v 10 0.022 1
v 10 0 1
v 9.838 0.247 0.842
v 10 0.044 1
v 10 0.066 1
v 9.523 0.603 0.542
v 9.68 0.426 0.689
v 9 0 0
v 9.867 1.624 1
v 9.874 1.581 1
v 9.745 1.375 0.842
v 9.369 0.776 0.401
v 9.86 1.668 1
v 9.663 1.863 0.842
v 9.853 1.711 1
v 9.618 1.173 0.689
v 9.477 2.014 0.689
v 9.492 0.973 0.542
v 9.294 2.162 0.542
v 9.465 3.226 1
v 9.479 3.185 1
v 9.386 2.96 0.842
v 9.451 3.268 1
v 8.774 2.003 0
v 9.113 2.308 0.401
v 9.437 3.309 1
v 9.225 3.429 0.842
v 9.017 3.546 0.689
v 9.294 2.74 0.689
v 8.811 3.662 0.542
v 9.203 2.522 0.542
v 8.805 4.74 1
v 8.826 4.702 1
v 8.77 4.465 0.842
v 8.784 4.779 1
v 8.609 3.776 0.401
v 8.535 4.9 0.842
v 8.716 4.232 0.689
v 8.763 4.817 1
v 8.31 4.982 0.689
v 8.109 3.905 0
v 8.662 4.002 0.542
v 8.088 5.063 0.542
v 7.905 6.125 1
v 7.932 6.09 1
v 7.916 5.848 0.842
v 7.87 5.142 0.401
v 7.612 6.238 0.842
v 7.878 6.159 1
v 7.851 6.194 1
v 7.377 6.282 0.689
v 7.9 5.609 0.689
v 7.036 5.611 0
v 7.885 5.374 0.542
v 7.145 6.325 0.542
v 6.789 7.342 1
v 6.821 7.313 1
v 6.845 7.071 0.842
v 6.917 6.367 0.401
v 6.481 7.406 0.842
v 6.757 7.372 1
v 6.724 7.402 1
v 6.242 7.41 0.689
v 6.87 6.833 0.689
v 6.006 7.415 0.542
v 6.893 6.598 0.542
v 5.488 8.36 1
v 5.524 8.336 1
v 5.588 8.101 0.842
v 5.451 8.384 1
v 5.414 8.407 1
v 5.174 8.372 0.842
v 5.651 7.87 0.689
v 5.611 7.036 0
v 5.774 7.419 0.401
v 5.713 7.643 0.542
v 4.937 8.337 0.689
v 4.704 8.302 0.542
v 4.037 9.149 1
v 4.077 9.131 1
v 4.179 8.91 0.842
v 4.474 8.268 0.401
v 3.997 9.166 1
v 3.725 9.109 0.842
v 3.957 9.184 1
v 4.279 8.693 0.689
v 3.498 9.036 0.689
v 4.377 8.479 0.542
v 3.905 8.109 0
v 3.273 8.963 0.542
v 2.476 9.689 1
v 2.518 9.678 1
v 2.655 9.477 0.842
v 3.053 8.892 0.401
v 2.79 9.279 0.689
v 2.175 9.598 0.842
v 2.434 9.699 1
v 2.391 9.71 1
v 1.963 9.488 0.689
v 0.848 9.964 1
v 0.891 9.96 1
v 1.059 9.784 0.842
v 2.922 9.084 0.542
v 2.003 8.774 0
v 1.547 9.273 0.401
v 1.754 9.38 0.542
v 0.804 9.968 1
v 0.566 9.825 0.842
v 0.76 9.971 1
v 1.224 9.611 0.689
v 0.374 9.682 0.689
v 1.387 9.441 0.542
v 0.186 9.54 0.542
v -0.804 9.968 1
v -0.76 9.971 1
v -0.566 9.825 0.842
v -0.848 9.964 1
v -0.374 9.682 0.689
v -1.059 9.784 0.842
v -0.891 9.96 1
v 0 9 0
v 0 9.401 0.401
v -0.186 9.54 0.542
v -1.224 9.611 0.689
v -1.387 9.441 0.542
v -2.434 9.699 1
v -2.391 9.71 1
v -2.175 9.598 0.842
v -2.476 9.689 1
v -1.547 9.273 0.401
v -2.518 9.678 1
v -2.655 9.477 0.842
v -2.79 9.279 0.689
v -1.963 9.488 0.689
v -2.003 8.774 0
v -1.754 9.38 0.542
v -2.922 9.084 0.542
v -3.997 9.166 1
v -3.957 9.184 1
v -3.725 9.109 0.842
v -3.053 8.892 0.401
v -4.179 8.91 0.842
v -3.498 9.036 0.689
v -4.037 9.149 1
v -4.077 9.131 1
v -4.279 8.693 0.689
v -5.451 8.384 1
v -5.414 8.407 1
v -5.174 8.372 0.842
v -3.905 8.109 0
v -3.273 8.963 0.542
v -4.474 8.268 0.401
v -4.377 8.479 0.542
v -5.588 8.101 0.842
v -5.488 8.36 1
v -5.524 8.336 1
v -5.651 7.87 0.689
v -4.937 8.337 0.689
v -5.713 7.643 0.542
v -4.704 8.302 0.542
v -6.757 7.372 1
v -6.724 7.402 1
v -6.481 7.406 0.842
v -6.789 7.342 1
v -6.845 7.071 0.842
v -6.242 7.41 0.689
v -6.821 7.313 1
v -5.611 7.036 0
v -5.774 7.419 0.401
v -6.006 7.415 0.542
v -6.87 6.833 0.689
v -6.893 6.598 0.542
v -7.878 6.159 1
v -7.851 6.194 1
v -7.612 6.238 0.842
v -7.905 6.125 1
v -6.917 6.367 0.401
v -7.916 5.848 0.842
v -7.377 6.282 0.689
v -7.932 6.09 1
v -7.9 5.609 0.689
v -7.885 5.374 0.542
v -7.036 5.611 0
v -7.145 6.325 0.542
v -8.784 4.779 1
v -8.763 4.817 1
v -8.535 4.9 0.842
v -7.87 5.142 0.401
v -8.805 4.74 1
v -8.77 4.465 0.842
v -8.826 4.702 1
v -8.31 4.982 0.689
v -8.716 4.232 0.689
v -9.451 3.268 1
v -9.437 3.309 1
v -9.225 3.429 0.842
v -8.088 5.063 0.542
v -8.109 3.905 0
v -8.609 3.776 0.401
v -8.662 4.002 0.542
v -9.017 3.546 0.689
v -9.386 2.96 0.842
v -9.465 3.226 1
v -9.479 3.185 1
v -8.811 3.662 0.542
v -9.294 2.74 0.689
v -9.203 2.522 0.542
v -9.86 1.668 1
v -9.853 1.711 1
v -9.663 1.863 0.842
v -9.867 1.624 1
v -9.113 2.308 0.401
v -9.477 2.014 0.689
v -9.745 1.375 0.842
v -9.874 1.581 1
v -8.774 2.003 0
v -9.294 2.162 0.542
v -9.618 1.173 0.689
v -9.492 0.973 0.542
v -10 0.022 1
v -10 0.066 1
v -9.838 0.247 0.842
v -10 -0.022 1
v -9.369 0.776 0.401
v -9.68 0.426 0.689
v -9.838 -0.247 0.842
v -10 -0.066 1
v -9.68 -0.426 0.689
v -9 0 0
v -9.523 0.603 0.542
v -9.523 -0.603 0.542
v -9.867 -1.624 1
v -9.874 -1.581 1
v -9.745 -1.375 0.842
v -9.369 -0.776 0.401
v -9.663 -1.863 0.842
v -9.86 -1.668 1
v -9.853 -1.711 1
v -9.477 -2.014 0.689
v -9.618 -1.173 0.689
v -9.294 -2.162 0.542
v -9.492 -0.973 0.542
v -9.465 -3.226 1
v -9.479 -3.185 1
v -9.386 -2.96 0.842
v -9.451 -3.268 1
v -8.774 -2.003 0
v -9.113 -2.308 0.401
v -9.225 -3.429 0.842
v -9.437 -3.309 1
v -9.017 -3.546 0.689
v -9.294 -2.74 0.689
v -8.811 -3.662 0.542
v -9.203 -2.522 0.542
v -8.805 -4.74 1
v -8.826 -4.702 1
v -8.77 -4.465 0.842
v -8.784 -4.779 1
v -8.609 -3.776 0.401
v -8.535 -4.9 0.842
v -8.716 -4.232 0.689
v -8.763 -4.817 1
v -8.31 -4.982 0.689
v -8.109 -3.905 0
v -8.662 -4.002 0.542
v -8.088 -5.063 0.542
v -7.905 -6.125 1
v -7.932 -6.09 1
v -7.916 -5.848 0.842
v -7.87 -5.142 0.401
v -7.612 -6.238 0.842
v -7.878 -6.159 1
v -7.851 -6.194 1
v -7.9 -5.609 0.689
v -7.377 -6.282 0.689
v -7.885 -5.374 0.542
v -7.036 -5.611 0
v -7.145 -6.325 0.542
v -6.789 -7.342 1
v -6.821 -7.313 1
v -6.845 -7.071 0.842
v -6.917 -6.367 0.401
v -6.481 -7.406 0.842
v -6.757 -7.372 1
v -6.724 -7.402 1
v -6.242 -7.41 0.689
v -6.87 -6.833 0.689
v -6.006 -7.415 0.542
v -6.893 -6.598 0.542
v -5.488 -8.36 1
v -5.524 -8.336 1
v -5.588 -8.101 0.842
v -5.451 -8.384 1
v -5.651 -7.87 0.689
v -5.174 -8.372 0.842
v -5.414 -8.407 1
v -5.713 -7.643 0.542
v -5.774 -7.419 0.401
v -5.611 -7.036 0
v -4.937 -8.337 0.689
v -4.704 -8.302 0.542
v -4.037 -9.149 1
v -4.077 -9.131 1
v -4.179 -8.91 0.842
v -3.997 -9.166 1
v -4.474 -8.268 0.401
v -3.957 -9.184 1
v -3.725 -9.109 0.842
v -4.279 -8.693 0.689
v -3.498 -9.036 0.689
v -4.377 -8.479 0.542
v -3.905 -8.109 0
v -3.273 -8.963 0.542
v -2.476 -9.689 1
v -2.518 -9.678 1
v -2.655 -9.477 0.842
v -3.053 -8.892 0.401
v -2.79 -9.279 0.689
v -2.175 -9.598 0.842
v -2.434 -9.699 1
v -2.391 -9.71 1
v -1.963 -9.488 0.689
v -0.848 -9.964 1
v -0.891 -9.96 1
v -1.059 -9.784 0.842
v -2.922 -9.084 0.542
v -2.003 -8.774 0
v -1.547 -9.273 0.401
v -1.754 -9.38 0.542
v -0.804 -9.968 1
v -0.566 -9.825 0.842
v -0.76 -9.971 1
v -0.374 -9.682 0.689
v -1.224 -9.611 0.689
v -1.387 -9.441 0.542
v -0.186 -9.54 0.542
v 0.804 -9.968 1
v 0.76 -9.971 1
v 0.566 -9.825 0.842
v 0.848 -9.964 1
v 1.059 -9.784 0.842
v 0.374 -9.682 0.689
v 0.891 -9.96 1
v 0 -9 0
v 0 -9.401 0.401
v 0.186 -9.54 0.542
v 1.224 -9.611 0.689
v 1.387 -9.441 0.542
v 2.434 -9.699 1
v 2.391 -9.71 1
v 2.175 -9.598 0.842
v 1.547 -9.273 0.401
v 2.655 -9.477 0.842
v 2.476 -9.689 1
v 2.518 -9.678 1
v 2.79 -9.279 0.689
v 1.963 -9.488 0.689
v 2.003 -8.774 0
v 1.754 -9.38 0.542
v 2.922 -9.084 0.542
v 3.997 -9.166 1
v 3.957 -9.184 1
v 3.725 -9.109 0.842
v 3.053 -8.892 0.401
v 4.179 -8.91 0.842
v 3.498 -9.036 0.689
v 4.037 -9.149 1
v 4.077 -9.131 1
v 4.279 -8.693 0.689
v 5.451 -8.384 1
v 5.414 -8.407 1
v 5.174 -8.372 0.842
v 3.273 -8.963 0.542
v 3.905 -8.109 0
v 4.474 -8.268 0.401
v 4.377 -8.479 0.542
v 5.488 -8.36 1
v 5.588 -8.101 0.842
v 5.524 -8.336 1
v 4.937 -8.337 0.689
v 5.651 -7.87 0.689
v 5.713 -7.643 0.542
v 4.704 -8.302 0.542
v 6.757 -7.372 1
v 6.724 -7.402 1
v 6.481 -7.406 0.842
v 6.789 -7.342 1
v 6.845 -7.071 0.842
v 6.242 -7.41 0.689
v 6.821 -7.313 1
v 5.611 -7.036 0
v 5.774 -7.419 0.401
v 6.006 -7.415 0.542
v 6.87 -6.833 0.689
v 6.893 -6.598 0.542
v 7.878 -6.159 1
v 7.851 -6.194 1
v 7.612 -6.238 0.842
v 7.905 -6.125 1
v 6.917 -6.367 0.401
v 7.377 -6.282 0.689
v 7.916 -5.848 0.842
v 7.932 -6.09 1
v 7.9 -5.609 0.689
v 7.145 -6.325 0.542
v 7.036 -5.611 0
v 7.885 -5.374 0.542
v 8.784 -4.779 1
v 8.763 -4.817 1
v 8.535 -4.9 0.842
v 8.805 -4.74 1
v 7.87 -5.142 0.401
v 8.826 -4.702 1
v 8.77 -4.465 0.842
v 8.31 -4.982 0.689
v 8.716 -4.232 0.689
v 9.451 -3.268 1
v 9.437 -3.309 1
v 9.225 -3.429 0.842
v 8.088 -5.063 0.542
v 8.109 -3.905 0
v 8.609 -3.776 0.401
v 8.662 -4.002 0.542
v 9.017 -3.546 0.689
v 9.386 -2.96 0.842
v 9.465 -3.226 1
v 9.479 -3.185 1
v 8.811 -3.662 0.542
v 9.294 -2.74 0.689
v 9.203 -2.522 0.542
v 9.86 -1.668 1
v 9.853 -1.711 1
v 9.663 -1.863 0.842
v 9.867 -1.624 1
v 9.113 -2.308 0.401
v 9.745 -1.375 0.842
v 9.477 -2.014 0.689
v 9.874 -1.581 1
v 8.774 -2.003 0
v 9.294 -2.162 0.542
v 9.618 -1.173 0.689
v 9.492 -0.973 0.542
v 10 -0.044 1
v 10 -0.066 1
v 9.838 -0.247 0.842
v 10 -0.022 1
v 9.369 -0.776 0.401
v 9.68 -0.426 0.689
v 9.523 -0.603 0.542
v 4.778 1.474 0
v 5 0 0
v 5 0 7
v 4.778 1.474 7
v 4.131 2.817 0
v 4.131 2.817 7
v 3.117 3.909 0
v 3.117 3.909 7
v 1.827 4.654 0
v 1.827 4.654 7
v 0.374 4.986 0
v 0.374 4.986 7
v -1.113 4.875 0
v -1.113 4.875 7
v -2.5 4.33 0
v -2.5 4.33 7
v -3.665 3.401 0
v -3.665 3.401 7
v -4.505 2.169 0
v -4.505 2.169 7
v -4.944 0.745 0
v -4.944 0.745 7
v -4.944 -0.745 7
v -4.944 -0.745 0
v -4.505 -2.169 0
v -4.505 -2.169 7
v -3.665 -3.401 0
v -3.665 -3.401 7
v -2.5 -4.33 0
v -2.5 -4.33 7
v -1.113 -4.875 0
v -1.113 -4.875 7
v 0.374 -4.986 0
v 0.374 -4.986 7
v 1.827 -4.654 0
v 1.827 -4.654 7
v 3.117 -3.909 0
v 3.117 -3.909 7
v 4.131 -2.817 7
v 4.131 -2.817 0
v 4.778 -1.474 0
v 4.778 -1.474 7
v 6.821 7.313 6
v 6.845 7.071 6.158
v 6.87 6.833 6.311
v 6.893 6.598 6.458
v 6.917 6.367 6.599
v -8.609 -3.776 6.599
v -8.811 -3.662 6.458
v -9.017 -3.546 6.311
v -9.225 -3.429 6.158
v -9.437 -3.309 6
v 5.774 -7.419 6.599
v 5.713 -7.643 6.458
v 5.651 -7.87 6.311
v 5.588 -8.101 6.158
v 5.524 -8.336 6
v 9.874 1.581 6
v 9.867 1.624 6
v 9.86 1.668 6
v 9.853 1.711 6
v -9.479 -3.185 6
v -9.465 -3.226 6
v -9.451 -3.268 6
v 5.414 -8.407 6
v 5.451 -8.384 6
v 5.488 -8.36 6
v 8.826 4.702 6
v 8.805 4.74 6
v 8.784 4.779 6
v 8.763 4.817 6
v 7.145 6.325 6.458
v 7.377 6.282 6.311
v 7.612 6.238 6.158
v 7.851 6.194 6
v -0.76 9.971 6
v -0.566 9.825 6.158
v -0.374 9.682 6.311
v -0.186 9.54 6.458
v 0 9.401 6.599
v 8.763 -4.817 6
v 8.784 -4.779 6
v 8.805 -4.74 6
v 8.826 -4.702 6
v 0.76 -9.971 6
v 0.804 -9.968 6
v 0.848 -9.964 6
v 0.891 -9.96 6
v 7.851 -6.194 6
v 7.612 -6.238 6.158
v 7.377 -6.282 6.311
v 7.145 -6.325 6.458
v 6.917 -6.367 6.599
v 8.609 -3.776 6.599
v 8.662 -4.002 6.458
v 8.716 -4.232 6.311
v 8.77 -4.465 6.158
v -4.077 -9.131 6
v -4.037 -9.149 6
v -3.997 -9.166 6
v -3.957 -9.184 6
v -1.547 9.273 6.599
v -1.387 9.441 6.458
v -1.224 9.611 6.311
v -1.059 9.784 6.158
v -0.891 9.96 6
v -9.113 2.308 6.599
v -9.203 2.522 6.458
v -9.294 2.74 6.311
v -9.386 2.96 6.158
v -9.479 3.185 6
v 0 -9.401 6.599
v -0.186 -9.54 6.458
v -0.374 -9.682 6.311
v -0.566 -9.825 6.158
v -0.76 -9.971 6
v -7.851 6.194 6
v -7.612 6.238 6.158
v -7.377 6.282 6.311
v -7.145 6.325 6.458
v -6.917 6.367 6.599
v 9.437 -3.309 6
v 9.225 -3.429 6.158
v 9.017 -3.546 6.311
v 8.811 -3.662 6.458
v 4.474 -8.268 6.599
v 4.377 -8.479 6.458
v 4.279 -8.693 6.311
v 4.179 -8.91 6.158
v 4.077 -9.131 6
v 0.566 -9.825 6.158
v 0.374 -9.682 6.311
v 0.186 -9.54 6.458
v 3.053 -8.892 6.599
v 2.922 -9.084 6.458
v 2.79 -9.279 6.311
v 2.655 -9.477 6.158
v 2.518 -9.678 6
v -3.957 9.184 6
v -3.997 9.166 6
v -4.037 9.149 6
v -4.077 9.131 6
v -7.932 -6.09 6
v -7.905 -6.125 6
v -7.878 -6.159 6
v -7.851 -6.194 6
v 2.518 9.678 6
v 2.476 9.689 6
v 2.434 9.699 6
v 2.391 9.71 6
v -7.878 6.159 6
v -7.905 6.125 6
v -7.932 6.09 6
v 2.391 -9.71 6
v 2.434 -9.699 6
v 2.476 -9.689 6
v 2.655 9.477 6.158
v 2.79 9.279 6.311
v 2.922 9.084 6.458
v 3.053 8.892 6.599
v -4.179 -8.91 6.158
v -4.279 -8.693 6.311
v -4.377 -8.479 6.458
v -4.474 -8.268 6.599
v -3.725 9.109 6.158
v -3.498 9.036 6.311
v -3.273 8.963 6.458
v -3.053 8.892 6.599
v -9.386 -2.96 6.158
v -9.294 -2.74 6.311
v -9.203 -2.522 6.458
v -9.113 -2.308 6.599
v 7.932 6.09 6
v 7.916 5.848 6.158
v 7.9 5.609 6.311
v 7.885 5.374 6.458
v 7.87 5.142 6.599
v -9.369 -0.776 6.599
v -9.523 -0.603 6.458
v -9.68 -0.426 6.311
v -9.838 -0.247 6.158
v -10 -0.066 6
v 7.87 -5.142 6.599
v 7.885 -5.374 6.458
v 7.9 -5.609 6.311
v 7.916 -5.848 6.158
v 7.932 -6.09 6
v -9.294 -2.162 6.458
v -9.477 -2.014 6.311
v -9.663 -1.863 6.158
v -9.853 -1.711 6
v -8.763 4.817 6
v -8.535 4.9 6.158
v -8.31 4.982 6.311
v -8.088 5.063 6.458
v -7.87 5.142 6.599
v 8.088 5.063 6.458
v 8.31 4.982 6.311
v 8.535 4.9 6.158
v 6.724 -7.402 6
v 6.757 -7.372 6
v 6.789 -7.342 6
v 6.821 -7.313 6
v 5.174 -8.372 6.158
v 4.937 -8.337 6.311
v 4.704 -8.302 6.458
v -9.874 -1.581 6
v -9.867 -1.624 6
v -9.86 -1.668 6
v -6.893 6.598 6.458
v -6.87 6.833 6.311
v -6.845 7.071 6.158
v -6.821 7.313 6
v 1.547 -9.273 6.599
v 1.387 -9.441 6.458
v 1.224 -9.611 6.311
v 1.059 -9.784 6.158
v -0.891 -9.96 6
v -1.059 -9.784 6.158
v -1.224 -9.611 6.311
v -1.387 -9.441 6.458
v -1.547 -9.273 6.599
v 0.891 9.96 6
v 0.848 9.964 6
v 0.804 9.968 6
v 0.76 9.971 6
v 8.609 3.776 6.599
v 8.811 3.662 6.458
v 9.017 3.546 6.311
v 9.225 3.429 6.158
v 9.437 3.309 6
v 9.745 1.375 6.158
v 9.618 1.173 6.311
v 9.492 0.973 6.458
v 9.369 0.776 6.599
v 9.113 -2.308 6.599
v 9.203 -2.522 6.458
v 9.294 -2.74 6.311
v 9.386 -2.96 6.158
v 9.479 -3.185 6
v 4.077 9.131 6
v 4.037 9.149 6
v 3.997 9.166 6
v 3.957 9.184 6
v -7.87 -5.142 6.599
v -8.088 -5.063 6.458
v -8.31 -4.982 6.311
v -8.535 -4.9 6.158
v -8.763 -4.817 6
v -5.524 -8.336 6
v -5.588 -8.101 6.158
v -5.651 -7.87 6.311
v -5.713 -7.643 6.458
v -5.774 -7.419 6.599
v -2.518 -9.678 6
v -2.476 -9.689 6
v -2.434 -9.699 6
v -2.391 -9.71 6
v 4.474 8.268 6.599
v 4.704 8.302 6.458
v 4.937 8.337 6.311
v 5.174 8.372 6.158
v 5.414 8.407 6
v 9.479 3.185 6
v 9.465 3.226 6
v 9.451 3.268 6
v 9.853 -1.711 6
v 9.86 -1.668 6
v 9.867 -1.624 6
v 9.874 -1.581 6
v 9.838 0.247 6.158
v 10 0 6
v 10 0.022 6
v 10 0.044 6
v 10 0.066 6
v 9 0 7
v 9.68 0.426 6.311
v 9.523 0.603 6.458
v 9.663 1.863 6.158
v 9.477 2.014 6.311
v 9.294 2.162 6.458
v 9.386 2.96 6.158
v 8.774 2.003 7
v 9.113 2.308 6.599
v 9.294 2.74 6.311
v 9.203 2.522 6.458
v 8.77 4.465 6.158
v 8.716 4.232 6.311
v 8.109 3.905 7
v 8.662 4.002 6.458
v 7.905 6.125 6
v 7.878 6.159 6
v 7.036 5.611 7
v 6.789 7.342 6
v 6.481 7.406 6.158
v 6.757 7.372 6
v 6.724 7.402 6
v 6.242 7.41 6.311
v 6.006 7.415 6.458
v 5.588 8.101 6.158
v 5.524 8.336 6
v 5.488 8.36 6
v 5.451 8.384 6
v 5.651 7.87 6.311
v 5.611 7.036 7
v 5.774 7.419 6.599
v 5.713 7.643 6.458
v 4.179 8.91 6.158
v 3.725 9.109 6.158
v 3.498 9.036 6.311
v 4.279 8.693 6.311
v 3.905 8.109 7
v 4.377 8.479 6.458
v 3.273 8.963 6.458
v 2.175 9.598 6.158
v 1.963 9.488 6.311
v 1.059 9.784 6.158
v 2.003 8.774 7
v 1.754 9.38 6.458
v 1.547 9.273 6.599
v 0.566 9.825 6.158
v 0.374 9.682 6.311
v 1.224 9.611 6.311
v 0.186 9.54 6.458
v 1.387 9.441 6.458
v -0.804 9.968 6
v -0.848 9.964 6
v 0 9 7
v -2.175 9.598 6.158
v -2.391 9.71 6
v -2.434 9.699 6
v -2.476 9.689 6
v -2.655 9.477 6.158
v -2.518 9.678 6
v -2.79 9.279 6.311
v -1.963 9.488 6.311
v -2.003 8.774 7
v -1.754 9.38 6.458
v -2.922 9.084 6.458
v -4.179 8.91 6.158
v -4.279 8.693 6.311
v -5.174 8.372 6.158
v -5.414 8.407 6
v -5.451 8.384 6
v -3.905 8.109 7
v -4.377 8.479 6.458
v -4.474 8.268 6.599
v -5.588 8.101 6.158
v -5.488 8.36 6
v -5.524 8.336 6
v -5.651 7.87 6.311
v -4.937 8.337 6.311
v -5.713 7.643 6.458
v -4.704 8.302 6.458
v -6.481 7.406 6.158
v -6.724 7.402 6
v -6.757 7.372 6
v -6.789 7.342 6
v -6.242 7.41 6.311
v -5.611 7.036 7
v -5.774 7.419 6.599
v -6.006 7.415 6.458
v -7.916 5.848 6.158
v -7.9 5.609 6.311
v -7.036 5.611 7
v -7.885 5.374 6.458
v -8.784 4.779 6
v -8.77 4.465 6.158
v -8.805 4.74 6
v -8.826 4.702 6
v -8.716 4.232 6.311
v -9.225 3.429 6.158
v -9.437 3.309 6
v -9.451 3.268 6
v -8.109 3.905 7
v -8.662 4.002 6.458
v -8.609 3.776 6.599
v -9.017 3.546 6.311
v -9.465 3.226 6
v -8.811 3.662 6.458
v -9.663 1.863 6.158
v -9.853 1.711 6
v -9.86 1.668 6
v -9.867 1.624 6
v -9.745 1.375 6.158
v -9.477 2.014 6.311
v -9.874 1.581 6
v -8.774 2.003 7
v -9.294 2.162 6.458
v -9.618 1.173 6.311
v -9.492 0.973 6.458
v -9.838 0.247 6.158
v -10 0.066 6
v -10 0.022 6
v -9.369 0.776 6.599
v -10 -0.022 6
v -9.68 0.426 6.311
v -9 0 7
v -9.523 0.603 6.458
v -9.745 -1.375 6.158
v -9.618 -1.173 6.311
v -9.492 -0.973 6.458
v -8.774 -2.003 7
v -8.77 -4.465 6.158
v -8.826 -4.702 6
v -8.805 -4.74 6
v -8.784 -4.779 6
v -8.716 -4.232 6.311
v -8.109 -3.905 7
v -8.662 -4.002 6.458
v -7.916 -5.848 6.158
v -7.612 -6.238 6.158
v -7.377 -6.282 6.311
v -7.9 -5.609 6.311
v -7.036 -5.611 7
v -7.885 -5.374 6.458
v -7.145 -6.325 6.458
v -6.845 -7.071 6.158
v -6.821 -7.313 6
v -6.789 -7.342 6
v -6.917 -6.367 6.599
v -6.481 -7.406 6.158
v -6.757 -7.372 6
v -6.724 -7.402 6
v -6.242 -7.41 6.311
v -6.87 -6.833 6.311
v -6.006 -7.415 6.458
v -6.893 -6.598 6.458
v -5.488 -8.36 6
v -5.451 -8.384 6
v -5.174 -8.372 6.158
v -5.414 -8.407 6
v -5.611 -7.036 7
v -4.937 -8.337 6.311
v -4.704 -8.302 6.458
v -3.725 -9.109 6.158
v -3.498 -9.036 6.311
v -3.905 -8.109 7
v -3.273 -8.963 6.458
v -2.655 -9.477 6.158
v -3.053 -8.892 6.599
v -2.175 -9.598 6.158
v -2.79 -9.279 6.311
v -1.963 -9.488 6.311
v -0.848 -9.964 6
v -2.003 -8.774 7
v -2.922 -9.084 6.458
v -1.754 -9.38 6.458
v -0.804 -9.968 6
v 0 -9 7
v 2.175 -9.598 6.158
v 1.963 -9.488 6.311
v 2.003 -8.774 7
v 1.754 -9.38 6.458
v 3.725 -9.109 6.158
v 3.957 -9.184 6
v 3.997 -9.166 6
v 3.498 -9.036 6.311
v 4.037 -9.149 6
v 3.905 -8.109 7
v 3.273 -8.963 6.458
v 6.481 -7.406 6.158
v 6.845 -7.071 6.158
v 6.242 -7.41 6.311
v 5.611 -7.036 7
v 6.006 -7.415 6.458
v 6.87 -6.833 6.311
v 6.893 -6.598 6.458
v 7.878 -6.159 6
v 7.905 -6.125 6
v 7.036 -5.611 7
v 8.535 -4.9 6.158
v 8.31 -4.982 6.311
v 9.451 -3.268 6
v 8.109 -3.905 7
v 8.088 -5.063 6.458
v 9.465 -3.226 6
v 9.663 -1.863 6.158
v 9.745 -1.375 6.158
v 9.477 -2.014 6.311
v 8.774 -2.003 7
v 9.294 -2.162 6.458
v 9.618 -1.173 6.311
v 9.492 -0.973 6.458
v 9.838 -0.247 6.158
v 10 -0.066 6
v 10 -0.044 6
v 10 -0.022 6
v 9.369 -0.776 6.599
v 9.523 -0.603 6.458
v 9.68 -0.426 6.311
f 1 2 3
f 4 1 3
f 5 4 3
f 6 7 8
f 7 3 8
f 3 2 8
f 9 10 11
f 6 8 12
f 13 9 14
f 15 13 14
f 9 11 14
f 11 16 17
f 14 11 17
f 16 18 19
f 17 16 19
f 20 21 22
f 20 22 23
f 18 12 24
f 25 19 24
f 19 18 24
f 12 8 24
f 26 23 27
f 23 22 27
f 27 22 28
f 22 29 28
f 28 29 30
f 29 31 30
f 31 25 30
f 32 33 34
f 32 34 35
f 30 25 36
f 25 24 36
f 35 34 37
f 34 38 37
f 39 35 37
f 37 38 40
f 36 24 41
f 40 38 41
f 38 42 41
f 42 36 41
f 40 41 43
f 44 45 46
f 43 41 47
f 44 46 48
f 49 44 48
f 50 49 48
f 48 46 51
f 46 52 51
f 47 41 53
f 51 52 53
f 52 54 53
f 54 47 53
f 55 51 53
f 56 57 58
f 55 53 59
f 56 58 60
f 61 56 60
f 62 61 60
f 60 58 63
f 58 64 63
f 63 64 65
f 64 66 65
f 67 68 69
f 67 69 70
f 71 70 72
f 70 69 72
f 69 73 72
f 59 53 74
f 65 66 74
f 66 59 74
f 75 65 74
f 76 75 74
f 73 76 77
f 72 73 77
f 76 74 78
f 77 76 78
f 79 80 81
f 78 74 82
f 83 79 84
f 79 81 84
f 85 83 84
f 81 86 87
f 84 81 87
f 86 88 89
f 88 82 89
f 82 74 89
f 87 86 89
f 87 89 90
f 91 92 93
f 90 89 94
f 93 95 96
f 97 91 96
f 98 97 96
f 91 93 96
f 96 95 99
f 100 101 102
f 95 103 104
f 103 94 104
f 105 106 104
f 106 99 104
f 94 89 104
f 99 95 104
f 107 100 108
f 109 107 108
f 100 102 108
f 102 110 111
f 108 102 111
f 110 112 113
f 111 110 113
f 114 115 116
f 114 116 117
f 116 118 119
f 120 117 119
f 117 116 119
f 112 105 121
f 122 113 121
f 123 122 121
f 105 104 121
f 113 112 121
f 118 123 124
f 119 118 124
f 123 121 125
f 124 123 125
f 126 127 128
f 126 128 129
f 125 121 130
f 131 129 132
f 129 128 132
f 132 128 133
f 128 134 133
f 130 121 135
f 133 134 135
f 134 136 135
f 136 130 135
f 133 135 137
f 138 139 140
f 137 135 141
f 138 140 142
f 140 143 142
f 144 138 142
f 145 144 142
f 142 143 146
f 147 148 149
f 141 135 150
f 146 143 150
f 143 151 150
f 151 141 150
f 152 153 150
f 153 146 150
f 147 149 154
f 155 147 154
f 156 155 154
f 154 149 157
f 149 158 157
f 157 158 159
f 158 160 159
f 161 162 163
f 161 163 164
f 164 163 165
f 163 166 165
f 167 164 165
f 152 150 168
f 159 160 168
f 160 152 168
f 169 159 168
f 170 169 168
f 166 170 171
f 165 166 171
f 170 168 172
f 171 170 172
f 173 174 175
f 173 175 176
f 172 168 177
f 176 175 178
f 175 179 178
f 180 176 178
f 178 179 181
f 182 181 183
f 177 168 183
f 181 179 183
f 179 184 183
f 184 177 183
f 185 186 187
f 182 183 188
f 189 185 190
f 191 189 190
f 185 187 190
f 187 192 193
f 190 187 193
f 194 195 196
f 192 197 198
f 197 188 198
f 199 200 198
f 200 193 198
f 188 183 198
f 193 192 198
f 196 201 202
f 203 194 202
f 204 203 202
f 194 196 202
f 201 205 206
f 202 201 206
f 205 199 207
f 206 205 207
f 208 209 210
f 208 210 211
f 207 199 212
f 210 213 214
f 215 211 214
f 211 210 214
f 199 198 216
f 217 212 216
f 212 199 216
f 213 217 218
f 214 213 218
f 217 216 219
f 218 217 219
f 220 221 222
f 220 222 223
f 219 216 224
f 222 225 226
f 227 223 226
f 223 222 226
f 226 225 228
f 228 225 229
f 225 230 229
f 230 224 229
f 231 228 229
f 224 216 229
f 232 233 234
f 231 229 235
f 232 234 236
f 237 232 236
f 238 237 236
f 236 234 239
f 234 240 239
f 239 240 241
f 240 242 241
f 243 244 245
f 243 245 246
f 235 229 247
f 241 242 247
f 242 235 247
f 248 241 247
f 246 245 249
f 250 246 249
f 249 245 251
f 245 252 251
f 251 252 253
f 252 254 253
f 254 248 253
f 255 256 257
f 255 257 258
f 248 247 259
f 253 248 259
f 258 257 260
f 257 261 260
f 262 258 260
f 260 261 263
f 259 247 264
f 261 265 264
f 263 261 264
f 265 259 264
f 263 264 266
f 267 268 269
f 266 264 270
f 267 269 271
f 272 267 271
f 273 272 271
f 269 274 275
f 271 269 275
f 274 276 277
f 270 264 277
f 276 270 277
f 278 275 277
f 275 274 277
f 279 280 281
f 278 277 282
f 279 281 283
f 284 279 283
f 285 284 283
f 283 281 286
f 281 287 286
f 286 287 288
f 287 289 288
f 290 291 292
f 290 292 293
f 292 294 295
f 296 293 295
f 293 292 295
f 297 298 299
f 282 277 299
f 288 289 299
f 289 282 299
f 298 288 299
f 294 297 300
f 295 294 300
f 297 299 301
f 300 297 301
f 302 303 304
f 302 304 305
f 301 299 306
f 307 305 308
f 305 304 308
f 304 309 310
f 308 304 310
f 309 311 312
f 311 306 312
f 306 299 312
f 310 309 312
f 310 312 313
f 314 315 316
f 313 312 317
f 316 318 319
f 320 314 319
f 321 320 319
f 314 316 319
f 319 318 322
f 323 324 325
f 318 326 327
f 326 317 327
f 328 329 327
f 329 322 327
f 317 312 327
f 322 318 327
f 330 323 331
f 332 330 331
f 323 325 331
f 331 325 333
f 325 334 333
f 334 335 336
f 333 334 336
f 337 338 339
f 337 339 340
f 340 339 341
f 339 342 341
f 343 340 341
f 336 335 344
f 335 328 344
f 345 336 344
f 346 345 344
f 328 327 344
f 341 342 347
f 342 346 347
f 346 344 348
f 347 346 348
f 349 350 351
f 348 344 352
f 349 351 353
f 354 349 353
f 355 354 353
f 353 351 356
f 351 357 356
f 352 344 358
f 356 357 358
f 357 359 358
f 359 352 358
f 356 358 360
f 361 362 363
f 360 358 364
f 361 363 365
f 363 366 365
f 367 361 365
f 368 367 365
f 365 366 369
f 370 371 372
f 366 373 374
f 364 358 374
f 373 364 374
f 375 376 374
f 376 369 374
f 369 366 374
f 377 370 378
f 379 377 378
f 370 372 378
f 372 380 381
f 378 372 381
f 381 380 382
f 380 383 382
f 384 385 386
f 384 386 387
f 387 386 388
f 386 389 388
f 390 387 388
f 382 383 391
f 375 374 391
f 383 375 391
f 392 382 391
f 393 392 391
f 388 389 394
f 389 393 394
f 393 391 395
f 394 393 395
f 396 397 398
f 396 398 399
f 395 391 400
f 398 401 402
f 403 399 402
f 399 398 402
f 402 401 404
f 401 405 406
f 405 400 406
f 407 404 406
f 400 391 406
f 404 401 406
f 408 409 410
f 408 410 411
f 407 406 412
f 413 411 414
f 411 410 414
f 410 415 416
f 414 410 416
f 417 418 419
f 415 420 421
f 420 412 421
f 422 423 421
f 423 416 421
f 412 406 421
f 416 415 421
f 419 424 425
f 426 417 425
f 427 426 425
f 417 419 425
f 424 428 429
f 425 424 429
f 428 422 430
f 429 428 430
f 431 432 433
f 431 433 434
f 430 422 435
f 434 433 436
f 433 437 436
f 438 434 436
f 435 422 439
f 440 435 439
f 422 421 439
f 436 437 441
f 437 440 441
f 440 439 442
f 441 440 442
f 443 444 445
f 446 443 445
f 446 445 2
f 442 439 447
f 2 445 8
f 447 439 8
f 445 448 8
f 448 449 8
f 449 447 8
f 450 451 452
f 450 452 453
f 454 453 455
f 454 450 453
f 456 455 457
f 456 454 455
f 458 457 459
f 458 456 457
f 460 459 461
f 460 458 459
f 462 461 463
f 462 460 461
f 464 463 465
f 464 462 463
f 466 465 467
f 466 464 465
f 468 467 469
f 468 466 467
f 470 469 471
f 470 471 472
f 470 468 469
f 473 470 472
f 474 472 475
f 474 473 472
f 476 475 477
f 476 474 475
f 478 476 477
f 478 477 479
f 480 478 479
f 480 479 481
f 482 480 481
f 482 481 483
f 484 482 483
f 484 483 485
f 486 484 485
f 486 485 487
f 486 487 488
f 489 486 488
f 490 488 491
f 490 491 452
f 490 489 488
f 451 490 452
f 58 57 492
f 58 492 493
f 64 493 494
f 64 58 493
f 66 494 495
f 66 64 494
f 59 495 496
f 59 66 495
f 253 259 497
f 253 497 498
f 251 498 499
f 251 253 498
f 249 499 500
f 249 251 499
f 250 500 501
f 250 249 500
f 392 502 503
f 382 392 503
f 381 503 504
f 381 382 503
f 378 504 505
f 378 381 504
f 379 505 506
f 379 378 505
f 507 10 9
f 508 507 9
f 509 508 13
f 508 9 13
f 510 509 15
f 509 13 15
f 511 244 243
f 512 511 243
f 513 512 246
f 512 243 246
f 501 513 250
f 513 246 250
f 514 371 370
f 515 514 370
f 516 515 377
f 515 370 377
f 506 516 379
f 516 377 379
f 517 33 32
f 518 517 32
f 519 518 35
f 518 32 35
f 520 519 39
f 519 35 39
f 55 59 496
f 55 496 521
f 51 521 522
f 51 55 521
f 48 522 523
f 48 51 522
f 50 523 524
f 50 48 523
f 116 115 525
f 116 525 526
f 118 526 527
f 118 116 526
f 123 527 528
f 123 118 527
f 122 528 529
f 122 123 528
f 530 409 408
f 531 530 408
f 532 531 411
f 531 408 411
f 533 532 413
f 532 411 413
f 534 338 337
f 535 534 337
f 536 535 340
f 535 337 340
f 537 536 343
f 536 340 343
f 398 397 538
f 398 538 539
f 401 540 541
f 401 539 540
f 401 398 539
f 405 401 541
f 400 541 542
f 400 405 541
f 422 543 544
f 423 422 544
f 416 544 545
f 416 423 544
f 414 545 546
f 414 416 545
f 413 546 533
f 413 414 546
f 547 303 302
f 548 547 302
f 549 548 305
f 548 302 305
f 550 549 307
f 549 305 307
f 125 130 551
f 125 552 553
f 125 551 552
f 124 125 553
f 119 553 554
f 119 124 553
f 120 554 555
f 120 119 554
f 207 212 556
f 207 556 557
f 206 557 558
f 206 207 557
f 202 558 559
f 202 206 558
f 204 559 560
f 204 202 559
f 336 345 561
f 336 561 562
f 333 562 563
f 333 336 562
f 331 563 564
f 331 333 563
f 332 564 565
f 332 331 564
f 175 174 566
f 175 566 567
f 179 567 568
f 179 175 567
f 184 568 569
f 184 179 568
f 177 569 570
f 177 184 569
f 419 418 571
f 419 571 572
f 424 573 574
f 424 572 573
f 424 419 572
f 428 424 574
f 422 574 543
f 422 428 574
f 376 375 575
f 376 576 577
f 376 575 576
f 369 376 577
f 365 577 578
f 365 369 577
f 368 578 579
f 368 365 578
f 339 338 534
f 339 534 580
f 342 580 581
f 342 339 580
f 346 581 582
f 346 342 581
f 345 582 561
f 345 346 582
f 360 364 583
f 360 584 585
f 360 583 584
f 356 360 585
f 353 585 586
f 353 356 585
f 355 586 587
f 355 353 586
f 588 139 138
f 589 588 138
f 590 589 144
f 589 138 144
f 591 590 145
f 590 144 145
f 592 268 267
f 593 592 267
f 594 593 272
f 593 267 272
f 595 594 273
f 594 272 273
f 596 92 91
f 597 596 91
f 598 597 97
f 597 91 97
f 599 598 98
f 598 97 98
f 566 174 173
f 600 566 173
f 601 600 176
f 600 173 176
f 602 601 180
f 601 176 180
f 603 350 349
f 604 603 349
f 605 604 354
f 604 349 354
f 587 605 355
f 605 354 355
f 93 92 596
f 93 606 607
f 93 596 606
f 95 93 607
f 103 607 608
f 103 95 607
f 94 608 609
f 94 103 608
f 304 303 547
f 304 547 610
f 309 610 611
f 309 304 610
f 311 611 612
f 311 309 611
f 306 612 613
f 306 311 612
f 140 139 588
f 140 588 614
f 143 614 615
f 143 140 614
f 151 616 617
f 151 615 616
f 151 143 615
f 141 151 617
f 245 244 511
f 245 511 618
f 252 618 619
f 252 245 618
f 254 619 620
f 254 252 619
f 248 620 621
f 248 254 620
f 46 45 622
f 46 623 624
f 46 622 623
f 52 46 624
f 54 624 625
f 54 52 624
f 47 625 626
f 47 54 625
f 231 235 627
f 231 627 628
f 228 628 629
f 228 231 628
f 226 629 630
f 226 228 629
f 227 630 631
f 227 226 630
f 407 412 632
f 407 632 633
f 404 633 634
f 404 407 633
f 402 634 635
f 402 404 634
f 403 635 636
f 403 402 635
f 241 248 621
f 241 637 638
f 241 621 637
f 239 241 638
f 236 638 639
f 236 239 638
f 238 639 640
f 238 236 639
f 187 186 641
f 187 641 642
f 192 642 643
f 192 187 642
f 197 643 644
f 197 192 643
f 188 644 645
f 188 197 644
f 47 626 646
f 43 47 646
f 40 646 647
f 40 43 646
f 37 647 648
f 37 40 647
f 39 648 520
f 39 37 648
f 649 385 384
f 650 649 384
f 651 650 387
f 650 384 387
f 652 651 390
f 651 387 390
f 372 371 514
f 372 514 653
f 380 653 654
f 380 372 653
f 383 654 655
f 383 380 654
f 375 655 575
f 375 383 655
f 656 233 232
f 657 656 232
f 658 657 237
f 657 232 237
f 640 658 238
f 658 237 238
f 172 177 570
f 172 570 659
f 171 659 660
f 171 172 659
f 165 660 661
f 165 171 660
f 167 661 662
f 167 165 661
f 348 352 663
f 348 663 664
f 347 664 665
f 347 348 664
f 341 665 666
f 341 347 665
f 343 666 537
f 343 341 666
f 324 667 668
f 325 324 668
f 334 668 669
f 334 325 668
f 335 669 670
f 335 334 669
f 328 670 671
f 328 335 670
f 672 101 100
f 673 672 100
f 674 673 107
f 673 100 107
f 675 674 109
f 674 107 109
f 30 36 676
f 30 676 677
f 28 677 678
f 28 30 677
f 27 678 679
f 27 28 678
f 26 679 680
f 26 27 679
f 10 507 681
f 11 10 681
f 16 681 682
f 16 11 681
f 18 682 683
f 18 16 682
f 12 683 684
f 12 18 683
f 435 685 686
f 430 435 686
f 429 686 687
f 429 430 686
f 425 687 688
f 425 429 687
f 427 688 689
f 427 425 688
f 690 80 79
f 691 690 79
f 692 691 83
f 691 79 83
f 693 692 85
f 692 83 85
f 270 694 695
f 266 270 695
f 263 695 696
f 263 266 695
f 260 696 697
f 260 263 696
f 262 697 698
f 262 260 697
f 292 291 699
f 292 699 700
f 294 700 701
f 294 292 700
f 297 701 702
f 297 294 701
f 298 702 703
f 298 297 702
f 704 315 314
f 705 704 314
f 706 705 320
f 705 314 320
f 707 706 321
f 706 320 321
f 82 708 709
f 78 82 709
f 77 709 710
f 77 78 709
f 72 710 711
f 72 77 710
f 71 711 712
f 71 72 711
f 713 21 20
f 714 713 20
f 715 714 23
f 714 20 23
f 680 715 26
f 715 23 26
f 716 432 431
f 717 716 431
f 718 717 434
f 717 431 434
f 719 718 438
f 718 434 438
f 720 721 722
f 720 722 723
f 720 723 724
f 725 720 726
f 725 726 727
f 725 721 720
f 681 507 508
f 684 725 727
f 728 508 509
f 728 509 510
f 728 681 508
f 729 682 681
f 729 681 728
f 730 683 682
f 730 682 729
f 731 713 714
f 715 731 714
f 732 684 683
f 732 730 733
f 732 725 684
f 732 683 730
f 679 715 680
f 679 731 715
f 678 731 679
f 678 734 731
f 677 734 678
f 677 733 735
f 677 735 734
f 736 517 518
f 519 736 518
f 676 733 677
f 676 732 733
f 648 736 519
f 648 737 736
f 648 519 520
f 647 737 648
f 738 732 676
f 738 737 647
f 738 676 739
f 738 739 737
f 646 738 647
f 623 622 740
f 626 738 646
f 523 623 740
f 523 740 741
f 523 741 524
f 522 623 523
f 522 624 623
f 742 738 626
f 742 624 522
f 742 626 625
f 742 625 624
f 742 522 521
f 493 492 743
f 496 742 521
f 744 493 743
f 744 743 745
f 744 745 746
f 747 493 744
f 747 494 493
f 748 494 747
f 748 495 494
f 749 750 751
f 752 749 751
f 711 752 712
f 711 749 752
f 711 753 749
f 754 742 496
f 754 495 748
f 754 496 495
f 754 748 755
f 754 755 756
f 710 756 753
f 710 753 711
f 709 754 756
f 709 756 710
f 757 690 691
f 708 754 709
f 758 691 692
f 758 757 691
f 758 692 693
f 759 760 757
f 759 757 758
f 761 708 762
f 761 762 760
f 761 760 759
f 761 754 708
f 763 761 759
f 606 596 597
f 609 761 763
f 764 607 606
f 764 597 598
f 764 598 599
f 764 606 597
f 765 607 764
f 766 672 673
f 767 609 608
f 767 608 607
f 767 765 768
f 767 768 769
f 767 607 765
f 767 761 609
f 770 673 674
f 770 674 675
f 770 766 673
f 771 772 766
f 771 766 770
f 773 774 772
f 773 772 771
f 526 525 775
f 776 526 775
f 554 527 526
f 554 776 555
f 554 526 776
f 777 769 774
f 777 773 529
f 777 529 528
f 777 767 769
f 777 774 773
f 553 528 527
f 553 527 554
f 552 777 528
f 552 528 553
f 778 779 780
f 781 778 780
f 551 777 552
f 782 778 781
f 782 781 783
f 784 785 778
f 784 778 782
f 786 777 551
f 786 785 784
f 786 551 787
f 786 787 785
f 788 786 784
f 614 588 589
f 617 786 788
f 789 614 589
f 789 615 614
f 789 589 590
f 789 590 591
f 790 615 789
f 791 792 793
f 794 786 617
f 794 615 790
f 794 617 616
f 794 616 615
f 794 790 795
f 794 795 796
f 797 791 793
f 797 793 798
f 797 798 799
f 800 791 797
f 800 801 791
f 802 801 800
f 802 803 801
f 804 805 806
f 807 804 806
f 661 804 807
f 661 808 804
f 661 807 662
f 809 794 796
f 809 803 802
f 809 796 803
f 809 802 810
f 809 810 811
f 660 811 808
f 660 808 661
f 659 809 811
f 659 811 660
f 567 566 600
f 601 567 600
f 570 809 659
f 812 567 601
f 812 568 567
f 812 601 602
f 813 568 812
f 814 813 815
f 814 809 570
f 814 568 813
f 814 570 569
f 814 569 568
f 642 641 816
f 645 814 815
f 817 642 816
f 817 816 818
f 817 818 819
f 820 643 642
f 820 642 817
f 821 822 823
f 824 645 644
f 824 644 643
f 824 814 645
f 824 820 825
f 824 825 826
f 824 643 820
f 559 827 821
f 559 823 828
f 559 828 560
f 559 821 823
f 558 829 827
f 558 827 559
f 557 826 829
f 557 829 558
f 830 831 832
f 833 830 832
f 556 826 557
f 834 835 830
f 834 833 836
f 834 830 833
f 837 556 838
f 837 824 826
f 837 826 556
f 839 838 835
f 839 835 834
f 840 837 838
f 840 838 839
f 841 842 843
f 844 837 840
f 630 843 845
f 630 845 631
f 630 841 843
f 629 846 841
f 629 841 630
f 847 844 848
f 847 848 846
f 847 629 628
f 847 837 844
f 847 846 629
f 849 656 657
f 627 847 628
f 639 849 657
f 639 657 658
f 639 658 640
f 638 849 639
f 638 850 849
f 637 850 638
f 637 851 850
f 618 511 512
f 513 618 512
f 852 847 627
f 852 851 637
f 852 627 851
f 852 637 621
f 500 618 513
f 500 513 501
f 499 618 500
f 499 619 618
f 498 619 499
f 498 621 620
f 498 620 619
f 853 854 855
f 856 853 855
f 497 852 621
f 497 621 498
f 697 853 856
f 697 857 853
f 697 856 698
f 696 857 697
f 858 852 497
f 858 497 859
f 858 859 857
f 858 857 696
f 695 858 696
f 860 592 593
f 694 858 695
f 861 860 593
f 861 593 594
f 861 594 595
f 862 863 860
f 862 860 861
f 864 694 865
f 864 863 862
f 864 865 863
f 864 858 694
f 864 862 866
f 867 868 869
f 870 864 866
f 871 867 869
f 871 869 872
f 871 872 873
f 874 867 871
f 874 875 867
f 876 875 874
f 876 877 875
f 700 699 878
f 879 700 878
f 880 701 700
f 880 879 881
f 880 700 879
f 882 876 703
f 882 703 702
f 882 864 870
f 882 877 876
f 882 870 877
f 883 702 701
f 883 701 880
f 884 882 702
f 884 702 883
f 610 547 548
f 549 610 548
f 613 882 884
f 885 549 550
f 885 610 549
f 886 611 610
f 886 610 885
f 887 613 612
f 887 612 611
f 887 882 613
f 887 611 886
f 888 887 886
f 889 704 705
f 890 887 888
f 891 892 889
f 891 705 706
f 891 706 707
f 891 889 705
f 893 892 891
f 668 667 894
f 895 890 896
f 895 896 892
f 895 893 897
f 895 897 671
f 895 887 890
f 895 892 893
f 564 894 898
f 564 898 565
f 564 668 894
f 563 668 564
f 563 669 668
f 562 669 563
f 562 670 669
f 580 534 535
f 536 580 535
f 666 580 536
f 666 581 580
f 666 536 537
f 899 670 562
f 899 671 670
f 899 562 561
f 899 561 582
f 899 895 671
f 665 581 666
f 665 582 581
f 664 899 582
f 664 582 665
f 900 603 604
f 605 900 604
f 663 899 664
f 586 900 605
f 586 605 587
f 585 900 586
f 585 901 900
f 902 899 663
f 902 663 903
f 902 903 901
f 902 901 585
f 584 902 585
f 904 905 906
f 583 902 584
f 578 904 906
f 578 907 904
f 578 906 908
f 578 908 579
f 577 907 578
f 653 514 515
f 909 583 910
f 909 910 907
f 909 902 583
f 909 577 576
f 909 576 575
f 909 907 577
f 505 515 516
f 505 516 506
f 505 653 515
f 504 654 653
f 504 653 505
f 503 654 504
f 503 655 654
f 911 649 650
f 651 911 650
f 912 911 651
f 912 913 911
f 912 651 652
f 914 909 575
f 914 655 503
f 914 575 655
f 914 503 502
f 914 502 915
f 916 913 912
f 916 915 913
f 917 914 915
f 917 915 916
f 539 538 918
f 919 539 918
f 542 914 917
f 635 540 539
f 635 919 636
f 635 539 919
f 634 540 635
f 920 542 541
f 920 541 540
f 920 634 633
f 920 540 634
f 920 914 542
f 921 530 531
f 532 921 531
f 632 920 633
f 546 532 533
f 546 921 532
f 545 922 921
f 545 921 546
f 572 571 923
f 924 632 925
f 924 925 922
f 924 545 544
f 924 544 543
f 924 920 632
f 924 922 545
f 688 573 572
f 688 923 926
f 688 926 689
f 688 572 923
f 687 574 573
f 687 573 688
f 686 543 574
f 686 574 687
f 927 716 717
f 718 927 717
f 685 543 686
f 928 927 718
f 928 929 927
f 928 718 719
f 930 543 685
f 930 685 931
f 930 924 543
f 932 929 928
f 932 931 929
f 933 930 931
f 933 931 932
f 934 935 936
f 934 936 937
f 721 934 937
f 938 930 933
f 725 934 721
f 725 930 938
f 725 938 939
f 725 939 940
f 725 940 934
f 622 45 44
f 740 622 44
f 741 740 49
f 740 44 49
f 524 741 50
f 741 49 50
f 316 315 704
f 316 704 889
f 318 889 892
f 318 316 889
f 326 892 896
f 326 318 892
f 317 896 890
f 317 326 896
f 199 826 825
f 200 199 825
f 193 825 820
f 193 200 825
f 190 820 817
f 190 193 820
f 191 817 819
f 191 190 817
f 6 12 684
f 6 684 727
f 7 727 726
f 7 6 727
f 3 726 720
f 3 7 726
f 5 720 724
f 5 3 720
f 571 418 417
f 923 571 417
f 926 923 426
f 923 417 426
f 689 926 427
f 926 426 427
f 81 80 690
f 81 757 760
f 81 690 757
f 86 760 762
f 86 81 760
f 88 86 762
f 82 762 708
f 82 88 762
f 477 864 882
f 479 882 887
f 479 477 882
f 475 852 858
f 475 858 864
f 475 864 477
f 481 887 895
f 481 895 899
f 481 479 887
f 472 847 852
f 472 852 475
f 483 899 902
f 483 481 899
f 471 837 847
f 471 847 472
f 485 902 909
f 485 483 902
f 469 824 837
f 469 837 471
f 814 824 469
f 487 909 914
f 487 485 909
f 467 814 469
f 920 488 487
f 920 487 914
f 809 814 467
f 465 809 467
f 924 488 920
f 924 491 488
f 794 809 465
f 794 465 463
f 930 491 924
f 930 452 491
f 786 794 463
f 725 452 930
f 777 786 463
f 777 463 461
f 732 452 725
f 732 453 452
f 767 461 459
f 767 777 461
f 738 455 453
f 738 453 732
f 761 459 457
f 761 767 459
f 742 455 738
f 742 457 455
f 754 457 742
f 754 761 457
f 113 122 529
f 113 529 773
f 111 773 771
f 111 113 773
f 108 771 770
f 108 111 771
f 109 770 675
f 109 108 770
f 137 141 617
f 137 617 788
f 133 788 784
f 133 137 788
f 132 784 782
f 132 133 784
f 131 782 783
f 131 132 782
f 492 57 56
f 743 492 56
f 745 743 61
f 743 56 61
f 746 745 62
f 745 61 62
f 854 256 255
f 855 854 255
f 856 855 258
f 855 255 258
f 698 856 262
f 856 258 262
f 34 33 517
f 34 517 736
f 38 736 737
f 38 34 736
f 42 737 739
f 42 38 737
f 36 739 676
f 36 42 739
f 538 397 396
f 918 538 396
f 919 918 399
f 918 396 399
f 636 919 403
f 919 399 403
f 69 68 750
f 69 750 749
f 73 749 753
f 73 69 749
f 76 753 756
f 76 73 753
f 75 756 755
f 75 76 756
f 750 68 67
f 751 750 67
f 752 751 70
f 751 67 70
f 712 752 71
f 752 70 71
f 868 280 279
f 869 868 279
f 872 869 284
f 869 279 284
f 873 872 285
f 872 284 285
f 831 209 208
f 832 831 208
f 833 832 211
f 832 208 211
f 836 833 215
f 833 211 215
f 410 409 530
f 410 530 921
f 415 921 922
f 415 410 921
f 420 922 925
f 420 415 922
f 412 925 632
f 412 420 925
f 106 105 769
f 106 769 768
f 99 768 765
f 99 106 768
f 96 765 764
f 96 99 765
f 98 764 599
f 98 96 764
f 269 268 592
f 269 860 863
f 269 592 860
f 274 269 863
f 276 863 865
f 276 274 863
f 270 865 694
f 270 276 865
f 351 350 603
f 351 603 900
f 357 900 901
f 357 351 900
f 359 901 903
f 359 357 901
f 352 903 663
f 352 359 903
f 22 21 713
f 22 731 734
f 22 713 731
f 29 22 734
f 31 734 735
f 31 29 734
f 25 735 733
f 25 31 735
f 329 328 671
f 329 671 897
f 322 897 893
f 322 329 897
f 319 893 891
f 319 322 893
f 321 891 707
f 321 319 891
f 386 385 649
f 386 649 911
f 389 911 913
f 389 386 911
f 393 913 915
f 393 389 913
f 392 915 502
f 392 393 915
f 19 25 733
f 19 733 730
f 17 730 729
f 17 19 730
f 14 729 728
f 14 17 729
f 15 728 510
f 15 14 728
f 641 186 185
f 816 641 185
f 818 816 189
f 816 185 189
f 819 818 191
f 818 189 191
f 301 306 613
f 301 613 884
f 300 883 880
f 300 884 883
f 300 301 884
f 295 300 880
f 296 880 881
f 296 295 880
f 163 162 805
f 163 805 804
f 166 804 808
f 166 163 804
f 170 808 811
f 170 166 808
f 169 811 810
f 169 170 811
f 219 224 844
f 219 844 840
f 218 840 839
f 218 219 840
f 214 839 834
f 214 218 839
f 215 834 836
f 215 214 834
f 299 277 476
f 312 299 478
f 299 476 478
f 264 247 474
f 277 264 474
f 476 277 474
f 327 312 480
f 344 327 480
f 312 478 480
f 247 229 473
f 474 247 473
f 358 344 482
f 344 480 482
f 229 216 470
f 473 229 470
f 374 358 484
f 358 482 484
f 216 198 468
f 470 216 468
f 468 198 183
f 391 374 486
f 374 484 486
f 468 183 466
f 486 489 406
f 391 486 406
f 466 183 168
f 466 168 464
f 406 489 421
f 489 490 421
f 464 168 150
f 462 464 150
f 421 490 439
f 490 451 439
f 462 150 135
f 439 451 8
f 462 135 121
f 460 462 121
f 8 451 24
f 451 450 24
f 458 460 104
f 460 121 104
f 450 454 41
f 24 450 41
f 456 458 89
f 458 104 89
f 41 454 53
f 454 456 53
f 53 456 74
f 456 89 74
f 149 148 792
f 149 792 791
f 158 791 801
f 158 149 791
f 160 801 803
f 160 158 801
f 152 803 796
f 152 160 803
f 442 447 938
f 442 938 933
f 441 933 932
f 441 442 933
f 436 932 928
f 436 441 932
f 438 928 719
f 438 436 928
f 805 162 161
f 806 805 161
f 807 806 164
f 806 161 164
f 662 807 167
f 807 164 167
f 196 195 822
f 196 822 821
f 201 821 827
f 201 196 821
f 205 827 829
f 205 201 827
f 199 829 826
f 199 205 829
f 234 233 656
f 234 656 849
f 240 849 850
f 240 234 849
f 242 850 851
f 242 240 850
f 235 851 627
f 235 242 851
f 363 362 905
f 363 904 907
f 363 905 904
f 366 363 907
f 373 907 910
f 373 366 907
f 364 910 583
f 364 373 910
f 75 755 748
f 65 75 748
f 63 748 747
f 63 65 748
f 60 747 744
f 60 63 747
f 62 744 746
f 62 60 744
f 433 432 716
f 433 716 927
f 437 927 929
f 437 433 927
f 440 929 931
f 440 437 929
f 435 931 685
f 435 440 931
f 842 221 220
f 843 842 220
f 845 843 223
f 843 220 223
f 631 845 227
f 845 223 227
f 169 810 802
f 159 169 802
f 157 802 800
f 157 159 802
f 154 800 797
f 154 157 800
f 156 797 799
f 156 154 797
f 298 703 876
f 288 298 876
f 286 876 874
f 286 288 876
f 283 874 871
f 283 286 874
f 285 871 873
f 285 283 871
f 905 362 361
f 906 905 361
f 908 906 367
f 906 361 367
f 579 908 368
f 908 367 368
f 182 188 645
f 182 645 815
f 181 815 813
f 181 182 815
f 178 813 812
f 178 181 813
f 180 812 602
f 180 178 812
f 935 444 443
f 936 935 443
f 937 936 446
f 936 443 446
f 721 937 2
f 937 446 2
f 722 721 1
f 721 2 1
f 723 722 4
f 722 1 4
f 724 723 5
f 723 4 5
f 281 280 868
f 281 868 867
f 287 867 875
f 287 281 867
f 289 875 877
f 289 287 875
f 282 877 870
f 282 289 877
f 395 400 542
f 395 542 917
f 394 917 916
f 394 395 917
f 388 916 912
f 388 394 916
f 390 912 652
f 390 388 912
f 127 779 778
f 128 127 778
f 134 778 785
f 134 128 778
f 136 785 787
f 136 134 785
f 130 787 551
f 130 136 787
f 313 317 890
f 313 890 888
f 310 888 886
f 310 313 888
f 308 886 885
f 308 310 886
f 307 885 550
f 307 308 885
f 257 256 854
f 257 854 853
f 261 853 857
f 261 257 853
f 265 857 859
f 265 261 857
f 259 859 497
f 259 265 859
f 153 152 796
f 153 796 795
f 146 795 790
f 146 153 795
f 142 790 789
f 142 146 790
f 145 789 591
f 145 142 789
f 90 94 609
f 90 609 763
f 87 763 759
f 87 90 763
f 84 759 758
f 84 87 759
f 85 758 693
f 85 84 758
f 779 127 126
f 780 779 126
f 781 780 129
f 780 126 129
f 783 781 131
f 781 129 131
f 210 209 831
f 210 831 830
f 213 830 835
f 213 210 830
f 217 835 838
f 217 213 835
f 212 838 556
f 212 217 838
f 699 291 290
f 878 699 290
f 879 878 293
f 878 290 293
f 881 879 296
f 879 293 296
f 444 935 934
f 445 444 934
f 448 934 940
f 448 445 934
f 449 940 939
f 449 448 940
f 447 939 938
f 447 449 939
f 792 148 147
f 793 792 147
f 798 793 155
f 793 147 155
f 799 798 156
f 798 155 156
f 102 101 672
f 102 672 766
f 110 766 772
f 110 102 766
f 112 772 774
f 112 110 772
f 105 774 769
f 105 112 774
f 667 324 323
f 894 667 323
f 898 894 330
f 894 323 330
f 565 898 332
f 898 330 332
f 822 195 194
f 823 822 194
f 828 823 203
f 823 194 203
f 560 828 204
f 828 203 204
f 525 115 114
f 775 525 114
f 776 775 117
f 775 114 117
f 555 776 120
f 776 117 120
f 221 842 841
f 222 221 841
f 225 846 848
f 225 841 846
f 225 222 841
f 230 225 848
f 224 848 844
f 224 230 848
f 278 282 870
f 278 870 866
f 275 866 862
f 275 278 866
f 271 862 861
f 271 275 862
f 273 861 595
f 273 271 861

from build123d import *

# Parameters (mm, degrees)
F0_R          = 10
F0_R_2        = 5
F1_DEPTH      = 7
F2_SIZE       = 1
F3_R          = 11.3100370754
F4_DEPTH      = 25
F4_DEPTH_BACK = 25


with BuildPart() as f1:
    # F0 (on Top) → F1 (new body)
    with BuildSketch(Plane.XY):
        Circle(F0_R)
        Circle(F0_R_2, mode=Mode.SUBTRACT)
    extrude(amount=F1_DEPTH)

    # F2
    f2_edges = [f1.edges().sort_by_distance(p)[0] for p in [
        (-10, 0, 7),
        (-10, 0, 0),
    ]]
    chamfer(f2_edges, length=F2_SIZE)

    # F3 (on Top) → F4 (cut, two sides)
    with BuildSketch(Plane.XY) as f4_sk:
        Circle(F3_R)
        Polygon((-0.8305830461, 10.0236467025), (0, 9.4011723995), (0.8305830461, 10.0236467025), (1.5473821193, 9.2729526615), (2.4690929981, 9.7502277502), (3.052555688, 8.8917909477), (4.0402525295, 9.2108480018), (4.474463495, 8.2680843559), (5.5012045041, 8.4202203307), (5.774319602, 7.4188459763), (6.8120979603, 7.399910999), (6.9166673227, 6.3672408179), (7.937175142, 6.1777513853), (7.8703463892, 5.1419539281), (8.8457468766, 4.787078818), (8.6093429228, 3.7764079393), (9.5130296954, 3.2658272195), (9.1134990242, 2.3078513862), (9.9208218628, 1.6554923679), (9.3690626294, 0.7763426634), (10.0579998714, 0), (9.3690626294, -0.7763426634), (9.9208218628, -1.6554923679), (9.1134990242, -2.3078513862), (9.5130296954, -3.2658272195), (8.6093429228, -3.7764079393), (8.8457468766, -4.787078818), (7.8703463892, -5.1419539281), (7.937175142, -6.1777513853), (6.9166673227, -6.3672408179), (6.8120979603, -7.399910999), (5.774319602, -7.4188459763), (5.5012045041, -8.4202203307), (4.474463495, -8.2680843559), (4.0402525295, -9.2108480018), (3.052555688, -8.8917909477), (2.4690929981, -9.7502277502), (1.5473821193, -9.2729526615), (0.8305830461, -10.0236467025), (0, -9.4011723995), (-0.8305830461, -10.0236467025), (-1.5473821193, -9.2729526615), (-2.4690929981, -9.7502277502), (-3.052555688, -8.8917909477), (-4.0402525295, -9.2108480018), (-4.474463495, -8.2680843559), (-5.5012045041, -8.4202203307), (-5.774319602, -7.4188459763), (-6.8120979603, -7.399910999), (-6.9166673227, -6.3672408179), (-7.937175142, -6.1777513853), (-7.8703463892, -5.1419539281), (-8.8457468766, -4.787078818), (-8.6093429228, -3.7764079393), (-9.5130296954, -3.2658272195), (-9.1134990242, -2.3078513862), (-9.9208218628, -1.6554923679), (-9.3690626294, -0.7763426634), (-10.0579998714, 0), (-9.3690626294, 0.7763426634), (-9.9208218628, 1.6554923679), (-9.1134990242, 2.3078513862), (-9.5130296954, 3.2658272195), (-8.6093429228, 3.7764079393), (-8.8457468766, 4.787078818), (-7.8703463892, 5.1419539281), (-7.937175142, 6.1777513853), (-6.9166673227, 6.3672408179), (-6.8120979603, 7.399910999), (-5.774319602, 7.4188459763), (-5.5012045041, 8.4202203307), (-4.474463495, 8.2680843559), (-4.0402525295, 9.2108480018), (-3.052555688, 8.8917909477), (-2.4690929981, 9.7502277502), (-1.5473821193, 9.2729526615), align=None, mode=Mode.SUBTRACT)
    extrude(amount=-F4_DEPTH, mode=Mode.SUBTRACT)
    extrude(f4_sk.sketch, amount=F4_DEPTH_BACK, mode=Mode.SUBTRACT)


solid = f1.part
